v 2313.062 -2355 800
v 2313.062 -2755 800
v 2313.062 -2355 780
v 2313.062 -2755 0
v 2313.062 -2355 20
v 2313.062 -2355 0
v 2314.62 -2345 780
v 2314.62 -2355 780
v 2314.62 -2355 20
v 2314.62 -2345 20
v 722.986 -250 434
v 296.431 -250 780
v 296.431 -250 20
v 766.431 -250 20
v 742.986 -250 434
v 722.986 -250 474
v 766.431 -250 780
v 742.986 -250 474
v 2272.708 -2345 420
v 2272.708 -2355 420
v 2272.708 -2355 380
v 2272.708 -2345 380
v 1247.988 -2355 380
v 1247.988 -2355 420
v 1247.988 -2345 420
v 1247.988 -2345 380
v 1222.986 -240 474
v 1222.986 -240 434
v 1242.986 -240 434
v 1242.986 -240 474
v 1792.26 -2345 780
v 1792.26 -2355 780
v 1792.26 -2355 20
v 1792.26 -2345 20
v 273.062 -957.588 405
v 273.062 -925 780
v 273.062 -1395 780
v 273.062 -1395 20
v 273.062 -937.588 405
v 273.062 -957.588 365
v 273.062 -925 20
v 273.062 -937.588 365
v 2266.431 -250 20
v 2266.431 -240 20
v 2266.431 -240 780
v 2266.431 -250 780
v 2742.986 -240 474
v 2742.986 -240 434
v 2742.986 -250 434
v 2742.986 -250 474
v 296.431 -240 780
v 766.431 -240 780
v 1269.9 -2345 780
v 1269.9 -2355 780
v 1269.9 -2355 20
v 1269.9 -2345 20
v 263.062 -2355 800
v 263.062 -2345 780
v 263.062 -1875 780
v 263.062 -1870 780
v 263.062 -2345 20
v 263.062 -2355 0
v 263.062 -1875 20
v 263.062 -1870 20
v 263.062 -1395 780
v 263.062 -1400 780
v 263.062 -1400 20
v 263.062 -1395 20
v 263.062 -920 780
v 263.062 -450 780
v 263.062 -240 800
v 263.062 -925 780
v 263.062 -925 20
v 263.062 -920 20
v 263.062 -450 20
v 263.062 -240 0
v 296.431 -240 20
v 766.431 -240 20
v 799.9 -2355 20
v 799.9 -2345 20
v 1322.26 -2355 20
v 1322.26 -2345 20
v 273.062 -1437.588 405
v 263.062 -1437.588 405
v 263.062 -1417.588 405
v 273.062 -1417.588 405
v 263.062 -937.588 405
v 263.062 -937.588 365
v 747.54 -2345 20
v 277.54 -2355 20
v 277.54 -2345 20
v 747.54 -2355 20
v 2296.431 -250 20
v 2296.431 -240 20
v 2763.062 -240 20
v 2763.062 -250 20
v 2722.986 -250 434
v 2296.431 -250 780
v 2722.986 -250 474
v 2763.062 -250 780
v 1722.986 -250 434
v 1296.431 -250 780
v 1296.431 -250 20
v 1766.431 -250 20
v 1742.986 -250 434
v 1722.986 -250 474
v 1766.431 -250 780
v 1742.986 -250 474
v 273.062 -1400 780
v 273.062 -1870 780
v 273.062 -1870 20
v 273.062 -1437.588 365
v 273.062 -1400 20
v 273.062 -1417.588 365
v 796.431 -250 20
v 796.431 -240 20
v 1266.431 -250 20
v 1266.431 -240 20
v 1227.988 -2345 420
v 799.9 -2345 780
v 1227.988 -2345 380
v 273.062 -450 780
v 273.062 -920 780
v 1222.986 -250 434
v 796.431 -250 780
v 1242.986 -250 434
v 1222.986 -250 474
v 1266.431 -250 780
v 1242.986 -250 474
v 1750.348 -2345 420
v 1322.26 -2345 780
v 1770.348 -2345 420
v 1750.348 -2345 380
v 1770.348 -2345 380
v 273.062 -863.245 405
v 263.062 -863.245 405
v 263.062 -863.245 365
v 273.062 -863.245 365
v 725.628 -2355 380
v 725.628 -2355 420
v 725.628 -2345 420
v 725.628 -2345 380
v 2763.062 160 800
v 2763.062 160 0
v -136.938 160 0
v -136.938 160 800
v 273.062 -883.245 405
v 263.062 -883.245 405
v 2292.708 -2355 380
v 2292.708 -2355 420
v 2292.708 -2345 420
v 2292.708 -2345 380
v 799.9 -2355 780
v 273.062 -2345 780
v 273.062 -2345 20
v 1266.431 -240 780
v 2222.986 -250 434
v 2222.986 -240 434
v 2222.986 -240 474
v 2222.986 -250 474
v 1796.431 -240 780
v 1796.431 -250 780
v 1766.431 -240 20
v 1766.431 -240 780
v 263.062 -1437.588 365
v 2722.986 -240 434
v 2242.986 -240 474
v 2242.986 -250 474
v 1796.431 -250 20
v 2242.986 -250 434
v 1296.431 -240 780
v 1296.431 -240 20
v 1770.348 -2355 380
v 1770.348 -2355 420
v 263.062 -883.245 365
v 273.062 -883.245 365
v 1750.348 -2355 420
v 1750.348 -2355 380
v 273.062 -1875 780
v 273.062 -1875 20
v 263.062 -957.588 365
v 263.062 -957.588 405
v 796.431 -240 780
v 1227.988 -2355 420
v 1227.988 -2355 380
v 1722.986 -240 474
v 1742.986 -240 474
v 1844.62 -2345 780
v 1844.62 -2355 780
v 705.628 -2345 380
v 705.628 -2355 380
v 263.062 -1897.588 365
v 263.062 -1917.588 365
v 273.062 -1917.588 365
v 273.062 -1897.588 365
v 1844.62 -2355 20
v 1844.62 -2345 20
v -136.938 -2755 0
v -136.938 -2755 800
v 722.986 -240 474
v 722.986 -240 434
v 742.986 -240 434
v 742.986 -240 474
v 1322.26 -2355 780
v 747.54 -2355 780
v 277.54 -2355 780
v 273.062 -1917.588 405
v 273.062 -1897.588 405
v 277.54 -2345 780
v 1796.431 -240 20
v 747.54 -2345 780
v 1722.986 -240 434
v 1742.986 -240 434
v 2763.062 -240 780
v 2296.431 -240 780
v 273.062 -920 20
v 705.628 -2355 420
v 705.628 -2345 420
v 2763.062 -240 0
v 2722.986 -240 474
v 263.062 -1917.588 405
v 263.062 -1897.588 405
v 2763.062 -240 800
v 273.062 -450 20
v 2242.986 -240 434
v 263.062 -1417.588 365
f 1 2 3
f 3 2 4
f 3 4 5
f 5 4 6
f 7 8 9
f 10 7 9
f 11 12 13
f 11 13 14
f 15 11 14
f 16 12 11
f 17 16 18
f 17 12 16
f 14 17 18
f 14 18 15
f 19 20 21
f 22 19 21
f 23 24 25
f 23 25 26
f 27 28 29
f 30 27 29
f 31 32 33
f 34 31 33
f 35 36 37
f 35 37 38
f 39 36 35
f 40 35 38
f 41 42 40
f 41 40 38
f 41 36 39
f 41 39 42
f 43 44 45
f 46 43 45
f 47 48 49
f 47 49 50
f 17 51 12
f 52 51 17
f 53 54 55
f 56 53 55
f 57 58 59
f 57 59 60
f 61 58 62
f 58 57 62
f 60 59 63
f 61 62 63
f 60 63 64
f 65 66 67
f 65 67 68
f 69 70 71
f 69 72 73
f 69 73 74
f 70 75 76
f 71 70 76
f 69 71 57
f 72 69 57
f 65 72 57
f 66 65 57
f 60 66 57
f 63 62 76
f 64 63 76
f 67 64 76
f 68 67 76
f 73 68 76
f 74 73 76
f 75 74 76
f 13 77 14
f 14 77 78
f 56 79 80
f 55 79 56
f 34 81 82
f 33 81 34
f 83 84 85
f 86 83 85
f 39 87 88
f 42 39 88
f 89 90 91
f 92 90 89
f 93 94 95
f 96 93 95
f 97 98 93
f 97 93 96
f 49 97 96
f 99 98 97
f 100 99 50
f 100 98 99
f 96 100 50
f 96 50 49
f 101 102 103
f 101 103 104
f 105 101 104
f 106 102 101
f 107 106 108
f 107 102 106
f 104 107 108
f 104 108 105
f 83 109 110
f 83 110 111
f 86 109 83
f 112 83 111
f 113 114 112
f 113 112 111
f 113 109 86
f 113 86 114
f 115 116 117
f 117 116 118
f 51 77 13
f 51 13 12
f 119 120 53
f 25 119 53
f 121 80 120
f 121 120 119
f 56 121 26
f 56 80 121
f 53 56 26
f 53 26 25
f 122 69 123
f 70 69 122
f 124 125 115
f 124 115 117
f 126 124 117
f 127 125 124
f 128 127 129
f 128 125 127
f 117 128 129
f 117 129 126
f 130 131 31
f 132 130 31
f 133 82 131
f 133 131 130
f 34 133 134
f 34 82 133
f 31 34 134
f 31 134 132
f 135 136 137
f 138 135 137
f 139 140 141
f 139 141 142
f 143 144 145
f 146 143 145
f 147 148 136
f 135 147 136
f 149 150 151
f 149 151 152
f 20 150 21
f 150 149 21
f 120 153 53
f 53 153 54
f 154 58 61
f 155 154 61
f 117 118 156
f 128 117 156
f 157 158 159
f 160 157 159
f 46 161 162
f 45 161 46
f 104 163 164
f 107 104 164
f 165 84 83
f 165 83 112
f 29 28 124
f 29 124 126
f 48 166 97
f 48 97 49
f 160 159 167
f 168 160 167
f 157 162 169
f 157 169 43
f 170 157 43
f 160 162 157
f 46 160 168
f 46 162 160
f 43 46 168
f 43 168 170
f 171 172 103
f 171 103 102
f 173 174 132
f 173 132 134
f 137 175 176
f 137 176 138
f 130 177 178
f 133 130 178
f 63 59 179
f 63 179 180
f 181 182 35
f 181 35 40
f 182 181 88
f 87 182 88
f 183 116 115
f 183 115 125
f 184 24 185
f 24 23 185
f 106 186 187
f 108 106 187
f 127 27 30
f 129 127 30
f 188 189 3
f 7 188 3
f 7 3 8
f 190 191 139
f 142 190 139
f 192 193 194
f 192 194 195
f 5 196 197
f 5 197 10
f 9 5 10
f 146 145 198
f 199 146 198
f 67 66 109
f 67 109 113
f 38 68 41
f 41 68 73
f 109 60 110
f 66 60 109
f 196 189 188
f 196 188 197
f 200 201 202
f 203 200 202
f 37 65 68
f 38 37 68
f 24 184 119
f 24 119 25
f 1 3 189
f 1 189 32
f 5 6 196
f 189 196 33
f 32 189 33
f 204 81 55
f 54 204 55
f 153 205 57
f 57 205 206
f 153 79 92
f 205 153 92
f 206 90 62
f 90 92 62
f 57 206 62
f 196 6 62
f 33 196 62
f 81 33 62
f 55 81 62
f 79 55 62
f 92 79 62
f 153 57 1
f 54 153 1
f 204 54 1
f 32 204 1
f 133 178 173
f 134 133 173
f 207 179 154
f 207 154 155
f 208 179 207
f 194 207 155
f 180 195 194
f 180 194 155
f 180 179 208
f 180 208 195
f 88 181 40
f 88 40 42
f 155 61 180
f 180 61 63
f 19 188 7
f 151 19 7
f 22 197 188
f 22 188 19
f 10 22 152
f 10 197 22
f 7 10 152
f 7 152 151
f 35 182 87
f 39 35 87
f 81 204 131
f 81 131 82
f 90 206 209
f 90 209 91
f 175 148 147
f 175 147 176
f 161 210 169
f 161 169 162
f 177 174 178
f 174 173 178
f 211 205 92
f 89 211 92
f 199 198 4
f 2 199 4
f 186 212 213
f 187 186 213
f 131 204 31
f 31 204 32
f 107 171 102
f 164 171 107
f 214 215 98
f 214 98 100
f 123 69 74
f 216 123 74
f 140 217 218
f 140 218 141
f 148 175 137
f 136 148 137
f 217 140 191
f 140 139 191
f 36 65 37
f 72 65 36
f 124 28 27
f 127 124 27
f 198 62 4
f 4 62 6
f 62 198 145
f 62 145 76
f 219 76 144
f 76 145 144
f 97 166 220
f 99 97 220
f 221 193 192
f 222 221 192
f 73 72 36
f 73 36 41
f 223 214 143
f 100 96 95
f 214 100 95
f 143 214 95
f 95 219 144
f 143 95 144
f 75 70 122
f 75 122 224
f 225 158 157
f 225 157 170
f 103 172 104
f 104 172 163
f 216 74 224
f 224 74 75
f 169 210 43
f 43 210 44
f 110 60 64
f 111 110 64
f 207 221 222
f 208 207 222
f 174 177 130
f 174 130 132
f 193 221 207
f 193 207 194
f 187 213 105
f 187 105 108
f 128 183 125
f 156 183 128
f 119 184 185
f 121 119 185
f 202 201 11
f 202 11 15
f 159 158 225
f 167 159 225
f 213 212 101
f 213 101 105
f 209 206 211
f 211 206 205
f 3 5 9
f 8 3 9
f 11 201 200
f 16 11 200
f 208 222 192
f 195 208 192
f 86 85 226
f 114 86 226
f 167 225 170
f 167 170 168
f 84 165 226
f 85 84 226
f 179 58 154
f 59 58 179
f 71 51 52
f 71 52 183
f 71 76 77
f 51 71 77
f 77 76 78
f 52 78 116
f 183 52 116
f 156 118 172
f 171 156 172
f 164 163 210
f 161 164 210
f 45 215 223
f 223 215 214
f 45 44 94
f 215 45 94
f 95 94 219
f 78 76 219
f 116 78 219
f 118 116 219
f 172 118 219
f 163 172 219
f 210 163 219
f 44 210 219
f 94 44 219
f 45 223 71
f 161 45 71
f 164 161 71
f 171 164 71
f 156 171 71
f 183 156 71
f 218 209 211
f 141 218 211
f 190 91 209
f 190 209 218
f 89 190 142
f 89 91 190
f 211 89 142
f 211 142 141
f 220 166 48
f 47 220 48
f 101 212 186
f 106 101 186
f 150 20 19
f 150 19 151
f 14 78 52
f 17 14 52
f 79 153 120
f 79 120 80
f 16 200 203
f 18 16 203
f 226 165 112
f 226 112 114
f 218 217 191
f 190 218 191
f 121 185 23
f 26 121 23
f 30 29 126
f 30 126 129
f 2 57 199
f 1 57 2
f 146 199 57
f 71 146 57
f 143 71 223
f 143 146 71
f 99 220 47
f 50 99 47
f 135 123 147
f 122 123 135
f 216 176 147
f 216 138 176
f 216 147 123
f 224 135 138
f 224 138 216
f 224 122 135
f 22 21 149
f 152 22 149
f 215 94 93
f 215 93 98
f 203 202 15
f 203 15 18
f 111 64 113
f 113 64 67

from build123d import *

# Parameters (mm, degrees)
BOSS_EXTRUDE1_DEPTH       = 800
SKETCH2_W                 = 470
SKETCH2_H                 = 760
SKETCH2_W_2               = 20
SKETCH2_H_2               = 40
BOSS_EXTRUDE2_DEPTH       = 10
SKETCH3_W                 = 760
SKETCH3_H                 = 470
SKETCH3_W_2               = 40
SKETCH3_H_2               = 20
BOSS_EXTRUDE3_DEPTH       = 10
BOSS_EXTRUDE4_OUTLINE_W   = 470
BOSS_EXTRUDE4_OUTLINE_H   = 760
BOSS_EXTRUDE4_OUTLINE_W_2 = 20
BOSS_EXTRUDE4_OUTLINE_H_2 = 40
BOSS_EXTRUDE4_OUTLINE_W_3 = 466.631060785
BOSS_EXTRUDE4_DEPTH       = 10


# Read off the part's stored shape, not the designer's step: Boss-Extrude4
with BuildPart() as part:
    # Sketch1 → Boss-Extrude1 (new body)
    with BuildSketch(Plane.XY):
        Polygon((2763.061970043, 160), (-136.938029957, 160), (-136.938029957, -2755), (2313.061970043, -2755), (2313.061970043, -2355), (263.061970043, -2355), (263.061970043, -240), (2763.061970043, -240), align=None)
    extrude(amount=BOSS_EXTRUDE1_DEPTH)

    # Sketch2 → Boss-Extrude2 (add)
    # profile 1 of 4: a face of its own
    with BuildSketch(Plane(origin=(0, -2355, 0), x_dir=(1, 0, 0), z_dir=(0, 1, 0))):
        with Locations((1034.900108644, -400)):
            Rectangle(SKETCH2_W, SKETCH2_H)
        with Locations((1237.987674913, -400)):
            Rectangle(SKETCH2_W_2, SKETCH2_H_2, mode=Mode.SUBTRACT)
    # profile 2 of 4: a face of its own
    with BuildSketch(Plane(origin=(0, -2355, 0), x_dir=(1, 0, 0), z_dir=(0, 1, 0))):
        with Locations((512.540108644, -400)):
            Rectangle(SKETCH2_W, SKETCH2_H)
        with Locations((715.627674913, -400)):
            Rectangle(SKETCH2_W_2, SKETCH2_H_2, mode=Mode.SUBTRACT)
    # profile 3 of 4: a face of its own
    with BuildSketch(Plane(origin=(0, -2355, 0), x_dir=(1, 0, 0), z_dir=(0, 1, 0))):
        with Locations((1557.260108644, -400)):
            Rectangle(SKETCH2_W, SKETCH2_H)
        with Locations((1760.347674913, -400)):
            Rectangle(SKETCH2_W_2, SKETCH2_H_2, mode=Mode.SUBTRACT)
    # profile 4 of 4: a face of its own
    with BuildSketch(Plane(origin=(0, -2355, 0), x_dir=(1, 0, 0), z_dir=(0, 1, 0))):
        with Locations((2079.620108644, -400)):
            Rectangle(SKETCH2_W, SKETCH2_H)
        with Locations((2282.707674913, -400)):
            Rectangle(SKETCH2_W_2, SKETCH2_H_2, mode=Mode.SUBTRACT)
    extrude(amount=BOSS_EXTRUDE2_DEPTH)

    # Sketch3 → Boss-Extrude3 (add)
    # profile 1 of 4: a face of its own
    with BuildSketch(Plane(origin=(263.061970043, 0, 0), x_dir=(0, 0, -1), z_dir=(1, 0, 0))):
        with Locations((-400, -1635)):
            Rectangle(SKETCH3_W, SKETCH3_H)
        with Locations((-385, -1427.588446785)):
            Rectangle(SKETCH3_W_2, SKETCH3_H_2, mode=Mode.SUBTRACT)
    # profile 2 of 4: a face of its own
    with BuildSketch(Plane(origin=(263.061970043, 0, 0), x_dir=(0, 0, -1), z_dir=(1, 0, 0))):
        with Locations((-400, -1160)):
            Rectangle(SKETCH3_W, SKETCH3_H)
        with Locations((-385, -947.588446785)):
            Rectangle(SKETCH3_W_2, SKETCH3_H_2, mode=Mode.SUBTRACT)
    # profile 3 of 4: a face of its own
    with BuildSketch(Plane(origin=(263.061970043, 0, 0), x_dir=(0, 0, -1), z_dir=(1, 0, 0))):
        with Locations((-400, -2110)):
            Rectangle(SKETCH3_W, SKETCH3_H)
        with Locations((-385, -1907.588446785)):
            Rectangle(SKETCH3_W_2, SKETCH3_H_2, mode=Mode.SUBTRACT)
    # profile 4 of 4: a face of its own
    with BuildSketch(Plane(origin=(263.061970043, 0, 0), x_dir=(0, 0, -1), z_dir=(1, 0, 0))):
        with Locations((-400, -685)):
            Rectangle(SKETCH3_W, SKETCH3_H)
        with Locations((-385, -873.244551229)):
            Rectangle(SKETCH3_W_2, SKETCH3_H_2, mode=Mode.SUBTRACT)
    extrude(amount=BOSS_EXTRUDE3_DEPTH)

    # Boss-Extrude4 outline → Boss-Extrude4 (add)
    # profile 1 of 5: a face of its own
    with BuildSketch(Plane.XZ.offset(240)):
        with Locations((531.430909258, 400)):
            Rectangle(BOSS_EXTRUDE4_OUTLINE_W, BOSS_EXTRUDE4_OUTLINE_H)
        with Locations((732.985950251, 454)):
            Rectangle(BOSS_EXTRUDE4_OUTLINE_W_2, BOSS_EXTRUDE4_OUTLINE_H_2, mode=Mode.SUBTRACT)
    # profile 2 of 5: a face of its own
    with BuildSketch(Plane.XZ.offset(240)):
        with Locations((1531.430909258, 400)):
            Rectangle(BOSS_EXTRUDE4_OUTLINE_W, BOSS_EXTRUDE4_OUTLINE_H)
        with Locations((1732.985950251, 454)):
            Rectangle(BOSS_EXTRUDE4_OUTLINE_W_2, BOSS_EXTRUDE4_OUTLINE_H_2, mode=Mode.SUBTRACT)
    # profile 3 of 5: a face of its own
    with BuildSketch(Plane.XZ.offset(240)):
        with Locations((2031.430909258, 400)):
            Rectangle(BOSS_EXTRUDE4_OUTLINE_W, BOSS_EXTRUDE4_OUTLINE_H)
        with Locations((2232.985950251, 454)):
            Rectangle(BOSS_EXTRUDE4_OUTLINE_W_2, BOSS_EXTRUDE4_OUTLINE_H_2, mode=Mode.SUBTRACT)
    # profile 4 of 5: a face of its own
    with BuildSketch(Plane.XZ.offset(240)):
        with Locations((2529.746439651, 400)):
            Rectangle(BOSS_EXTRUDE4_OUTLINE_W_3, BOSS_EXTRUDE4_OUTLINE_H)
        with Locations((2732.985950251, 454)):
            Rectangle(BOSS_EXTRUDE4_OUTLINE_W_2, BOSS_EXTRUDE4_OUTLINE_H_2, mode=Mode.SUBTRACT)
    # profile 5 of 5: a face of its own
    with BuildSketch(Plane.XZ.offset(240)):
        with Locations((1031.430909258, 400)):
            Rectangle(BOSS_EXTRUDE4_OUTLINE_W, BOSS_EXTRUDE4_OUTLINE_H)
        with Locations((1232.985950251, 454)):
            Rectangle(BOSS_EXTRUDE4_OUTLINE_W_2, BOSS_EXTRUDE4_OUTLINE_H_2, mode=Mode.SUBTRACT)
    extrude(amount=BOSS_EXTRUDE4_DEPTH)


solid = part.part
